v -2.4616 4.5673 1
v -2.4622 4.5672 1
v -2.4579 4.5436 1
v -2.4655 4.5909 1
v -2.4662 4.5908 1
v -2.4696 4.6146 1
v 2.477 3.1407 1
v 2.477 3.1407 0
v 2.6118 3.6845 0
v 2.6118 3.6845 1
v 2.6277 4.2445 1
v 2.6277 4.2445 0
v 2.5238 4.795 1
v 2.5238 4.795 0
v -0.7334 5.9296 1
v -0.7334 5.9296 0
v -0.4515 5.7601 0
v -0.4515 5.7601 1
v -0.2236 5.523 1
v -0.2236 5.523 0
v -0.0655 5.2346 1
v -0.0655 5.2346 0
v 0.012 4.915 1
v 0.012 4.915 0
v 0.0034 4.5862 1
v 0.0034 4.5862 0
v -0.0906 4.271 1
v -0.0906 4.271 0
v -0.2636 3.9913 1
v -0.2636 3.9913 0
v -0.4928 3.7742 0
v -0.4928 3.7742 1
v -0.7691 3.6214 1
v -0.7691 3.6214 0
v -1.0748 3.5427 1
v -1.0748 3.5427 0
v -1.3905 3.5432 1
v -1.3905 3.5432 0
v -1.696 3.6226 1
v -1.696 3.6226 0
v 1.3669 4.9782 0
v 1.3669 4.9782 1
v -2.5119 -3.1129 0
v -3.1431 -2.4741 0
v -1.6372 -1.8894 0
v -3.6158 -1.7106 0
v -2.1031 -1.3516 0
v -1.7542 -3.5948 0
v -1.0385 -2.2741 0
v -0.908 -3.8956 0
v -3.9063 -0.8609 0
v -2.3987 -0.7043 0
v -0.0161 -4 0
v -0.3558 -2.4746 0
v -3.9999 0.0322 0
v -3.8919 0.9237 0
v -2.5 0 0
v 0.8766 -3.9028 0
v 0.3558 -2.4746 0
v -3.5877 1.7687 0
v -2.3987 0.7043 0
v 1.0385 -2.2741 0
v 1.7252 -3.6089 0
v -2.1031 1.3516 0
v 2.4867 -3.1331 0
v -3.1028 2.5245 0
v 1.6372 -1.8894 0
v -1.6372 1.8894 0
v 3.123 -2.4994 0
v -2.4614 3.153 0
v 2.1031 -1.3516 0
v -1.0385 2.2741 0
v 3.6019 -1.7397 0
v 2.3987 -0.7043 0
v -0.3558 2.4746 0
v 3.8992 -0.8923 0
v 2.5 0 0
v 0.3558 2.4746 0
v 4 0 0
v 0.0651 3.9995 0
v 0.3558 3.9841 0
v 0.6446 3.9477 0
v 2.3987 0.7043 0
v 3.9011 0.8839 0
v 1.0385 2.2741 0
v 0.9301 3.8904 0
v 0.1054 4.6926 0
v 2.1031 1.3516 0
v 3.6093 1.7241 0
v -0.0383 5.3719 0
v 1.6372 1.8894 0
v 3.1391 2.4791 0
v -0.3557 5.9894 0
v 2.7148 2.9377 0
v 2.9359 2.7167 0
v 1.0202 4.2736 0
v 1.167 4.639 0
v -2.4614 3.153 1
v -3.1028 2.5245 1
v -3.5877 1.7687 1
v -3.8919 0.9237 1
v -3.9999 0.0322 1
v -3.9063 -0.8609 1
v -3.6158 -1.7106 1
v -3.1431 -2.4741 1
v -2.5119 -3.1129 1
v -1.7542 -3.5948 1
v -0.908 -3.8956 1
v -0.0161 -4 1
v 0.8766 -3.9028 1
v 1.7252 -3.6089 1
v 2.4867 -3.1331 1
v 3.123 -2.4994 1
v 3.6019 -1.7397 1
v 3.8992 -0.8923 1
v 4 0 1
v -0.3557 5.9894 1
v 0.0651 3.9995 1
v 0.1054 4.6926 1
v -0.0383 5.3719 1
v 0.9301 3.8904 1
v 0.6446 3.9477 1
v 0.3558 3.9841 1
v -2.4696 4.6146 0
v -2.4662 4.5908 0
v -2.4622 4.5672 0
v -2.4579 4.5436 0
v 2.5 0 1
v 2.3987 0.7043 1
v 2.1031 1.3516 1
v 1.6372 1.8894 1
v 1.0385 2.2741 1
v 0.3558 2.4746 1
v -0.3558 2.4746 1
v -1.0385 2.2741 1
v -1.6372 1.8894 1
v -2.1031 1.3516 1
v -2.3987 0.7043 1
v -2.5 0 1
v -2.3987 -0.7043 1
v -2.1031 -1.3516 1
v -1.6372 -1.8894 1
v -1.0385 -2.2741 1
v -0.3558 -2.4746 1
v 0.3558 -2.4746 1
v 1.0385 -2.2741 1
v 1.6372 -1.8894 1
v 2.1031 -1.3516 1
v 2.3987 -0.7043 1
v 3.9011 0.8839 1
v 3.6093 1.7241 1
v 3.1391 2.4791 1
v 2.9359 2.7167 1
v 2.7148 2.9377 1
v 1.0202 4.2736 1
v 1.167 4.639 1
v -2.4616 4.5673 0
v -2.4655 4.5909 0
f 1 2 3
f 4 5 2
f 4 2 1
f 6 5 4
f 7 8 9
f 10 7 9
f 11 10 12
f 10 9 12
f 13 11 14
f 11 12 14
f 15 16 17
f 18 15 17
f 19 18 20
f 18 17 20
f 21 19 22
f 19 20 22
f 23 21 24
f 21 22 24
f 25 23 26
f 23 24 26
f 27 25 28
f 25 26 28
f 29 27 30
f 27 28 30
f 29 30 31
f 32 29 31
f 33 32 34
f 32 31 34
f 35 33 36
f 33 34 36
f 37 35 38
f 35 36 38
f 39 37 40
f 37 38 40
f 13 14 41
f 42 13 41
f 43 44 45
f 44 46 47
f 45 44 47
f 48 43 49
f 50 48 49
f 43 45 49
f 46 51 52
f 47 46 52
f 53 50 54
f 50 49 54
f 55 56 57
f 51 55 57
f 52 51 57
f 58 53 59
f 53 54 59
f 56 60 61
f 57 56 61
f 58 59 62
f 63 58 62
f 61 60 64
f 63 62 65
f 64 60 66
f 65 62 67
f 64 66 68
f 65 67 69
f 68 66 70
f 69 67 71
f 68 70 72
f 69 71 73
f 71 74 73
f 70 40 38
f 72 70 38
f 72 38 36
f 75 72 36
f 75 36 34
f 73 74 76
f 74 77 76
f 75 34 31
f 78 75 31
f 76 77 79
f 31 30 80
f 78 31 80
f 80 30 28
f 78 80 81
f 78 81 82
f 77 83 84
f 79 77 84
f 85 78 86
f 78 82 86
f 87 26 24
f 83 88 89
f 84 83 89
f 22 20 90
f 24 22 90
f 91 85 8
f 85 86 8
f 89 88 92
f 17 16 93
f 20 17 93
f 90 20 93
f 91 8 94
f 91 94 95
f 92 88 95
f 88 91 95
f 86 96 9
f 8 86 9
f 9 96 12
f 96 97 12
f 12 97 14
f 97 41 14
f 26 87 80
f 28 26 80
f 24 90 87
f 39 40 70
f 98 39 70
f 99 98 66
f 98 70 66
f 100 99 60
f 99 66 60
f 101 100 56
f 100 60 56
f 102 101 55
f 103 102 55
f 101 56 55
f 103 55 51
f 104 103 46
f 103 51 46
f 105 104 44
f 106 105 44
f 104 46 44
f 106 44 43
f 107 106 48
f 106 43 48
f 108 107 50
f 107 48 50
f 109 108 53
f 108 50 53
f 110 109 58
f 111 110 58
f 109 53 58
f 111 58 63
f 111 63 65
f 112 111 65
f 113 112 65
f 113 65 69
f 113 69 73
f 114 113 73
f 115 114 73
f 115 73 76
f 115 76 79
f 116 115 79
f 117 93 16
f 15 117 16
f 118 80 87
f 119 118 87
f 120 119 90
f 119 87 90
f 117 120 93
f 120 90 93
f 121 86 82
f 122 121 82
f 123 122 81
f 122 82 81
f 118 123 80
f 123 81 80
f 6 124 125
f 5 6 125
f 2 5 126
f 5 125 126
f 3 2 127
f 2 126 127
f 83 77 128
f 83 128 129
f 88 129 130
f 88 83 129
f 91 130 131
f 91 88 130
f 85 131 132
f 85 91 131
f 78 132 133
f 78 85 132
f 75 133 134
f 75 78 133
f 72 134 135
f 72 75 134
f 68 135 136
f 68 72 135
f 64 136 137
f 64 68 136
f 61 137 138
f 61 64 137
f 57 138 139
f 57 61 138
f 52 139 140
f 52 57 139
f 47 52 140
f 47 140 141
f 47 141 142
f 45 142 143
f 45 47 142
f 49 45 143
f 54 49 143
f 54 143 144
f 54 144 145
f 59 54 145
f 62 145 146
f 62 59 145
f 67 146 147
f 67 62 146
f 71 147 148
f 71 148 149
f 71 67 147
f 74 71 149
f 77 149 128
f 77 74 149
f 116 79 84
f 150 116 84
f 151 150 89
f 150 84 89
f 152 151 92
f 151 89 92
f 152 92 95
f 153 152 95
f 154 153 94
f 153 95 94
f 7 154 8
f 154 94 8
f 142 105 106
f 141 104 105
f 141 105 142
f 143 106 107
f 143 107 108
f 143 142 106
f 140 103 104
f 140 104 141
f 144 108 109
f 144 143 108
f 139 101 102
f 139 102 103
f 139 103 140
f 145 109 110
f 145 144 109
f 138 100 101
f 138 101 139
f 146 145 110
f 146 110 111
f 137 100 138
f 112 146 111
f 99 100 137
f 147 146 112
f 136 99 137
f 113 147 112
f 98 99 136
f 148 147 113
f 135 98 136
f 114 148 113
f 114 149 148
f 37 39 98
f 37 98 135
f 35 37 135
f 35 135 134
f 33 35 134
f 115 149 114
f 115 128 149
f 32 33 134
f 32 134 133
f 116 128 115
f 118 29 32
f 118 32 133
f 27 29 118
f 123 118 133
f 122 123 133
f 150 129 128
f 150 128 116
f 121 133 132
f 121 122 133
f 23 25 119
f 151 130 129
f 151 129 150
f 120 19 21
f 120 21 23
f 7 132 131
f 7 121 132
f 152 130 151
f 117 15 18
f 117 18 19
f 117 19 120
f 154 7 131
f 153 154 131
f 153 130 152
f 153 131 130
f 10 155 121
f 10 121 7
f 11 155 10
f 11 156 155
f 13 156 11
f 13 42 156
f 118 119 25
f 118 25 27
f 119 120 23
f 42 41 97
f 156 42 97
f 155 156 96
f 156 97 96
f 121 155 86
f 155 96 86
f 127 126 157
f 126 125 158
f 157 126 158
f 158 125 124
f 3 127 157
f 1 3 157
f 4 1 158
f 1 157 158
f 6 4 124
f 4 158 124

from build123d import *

# Parameters (mm, degrees)
F2_R     = 2.5
F3_DEPTH = 1


# Not quite as in the source:
# - a feature of the source that left no trace in its solid (it failed there, or was rolled back) is left out


with BuildPart() as f3:
    # F2 (on Top) → F3 (new body)
    with BuildSketch(Plane.XY):
        with BuildLine():
            ThreePointArc((-1.6960043415, 3.6226467222), (-2.1466232359, -3.3752049839), (4, 0))
            ThreePointArc((4, 0), (3.7786523245, 1.3121686669), (3.1391066948, 2.4791145917))
            ThreePointArc((3.1391066948, 2.4791145917), (2.8274967449, 2.8293571986), (2.4770492462, 3.1407367021))
            ThreePointArc((2.4770492462, 3.1407367021), (1.7443008848, 3.5996408742), (0.9300595273, 3.8903713545))
            ThreePointArc((0.9300595273, 3.8903713545), (0.5005649816, 3.9685557447), (0.0651081325, 3.9994700813))
            ThreePointArc((0.0651081325, 3.9994700813), (-0.0993482735, 3.9987660497), (-0.2636367411, 3.9913025028))
            ThreePointArc((-0.2636367411, 3.9913025028), (-0.9194446737, 3.572391456), (-1.6960043415, 3.6226467222))
        make_face()
        Circle(F2_R, mode=Mode.SUBTRACT)
        with BuildLine():
            ThreePointArc((0.9300595273, 3.8903713545), (1.7443008848, 3.5996408742), (2.4770492462, 3.1407367021))
            ThreePointArc((2.4770492462, 3.1407367021), (2.6347989126, 3.9640717606), (2.5237715391, 4.7949980498))
            Line((2.5237715391, 4.7949980498), (1.3669232641, 4.9782248164))
            ThreePointArc((1.3669232641, 4.9782248164), (1.0867126989, 4.4591073757), (0.9300595273, 3.8903713545))
        make_face()
        with BuildLine():
            ThreePointArc((-0.733402564, 5.9296250647), (-0.0161783263, 5.0773625262), (-0.2636367411, 3.9913025028))
            ThreePointArc((-0.2636367411, 3.9913025028), (-0.0993482735, 3.9987660497), (0.0651081325, 3.9994700813))
            ThreePointArc((0.0651081325, 3.9994700813), (0.0562243119, 5.0370730396), (-0.3557009583, 5.9894471221))
            Line((-0.3557009583, 5.9894471221), (-0.733402564, 5.9296250647))
        make_face()
    extrude(amount=F3_DEPTH)


with BuildPart() as f3b:
    # F2 (on Top) → F3, piece 2 (new body)
    with BuildSketch(Plane.XY):
        with BuildLine():
            ThreePointArc((-2.4696169155, 4.6145588285), (-2.4642610911, 4.5790010988), (-2.4578846973, 4.5436121372))
            ThreePointArc((-2.4578846973, 4.5436121372), (-2.4635067961, 4.579125834), (-2.4696169155, 4.6145588285))
        make_face()
    extrude(amount=F3_DEPTH)


solid = Compound([f3.part, f3b.part])
